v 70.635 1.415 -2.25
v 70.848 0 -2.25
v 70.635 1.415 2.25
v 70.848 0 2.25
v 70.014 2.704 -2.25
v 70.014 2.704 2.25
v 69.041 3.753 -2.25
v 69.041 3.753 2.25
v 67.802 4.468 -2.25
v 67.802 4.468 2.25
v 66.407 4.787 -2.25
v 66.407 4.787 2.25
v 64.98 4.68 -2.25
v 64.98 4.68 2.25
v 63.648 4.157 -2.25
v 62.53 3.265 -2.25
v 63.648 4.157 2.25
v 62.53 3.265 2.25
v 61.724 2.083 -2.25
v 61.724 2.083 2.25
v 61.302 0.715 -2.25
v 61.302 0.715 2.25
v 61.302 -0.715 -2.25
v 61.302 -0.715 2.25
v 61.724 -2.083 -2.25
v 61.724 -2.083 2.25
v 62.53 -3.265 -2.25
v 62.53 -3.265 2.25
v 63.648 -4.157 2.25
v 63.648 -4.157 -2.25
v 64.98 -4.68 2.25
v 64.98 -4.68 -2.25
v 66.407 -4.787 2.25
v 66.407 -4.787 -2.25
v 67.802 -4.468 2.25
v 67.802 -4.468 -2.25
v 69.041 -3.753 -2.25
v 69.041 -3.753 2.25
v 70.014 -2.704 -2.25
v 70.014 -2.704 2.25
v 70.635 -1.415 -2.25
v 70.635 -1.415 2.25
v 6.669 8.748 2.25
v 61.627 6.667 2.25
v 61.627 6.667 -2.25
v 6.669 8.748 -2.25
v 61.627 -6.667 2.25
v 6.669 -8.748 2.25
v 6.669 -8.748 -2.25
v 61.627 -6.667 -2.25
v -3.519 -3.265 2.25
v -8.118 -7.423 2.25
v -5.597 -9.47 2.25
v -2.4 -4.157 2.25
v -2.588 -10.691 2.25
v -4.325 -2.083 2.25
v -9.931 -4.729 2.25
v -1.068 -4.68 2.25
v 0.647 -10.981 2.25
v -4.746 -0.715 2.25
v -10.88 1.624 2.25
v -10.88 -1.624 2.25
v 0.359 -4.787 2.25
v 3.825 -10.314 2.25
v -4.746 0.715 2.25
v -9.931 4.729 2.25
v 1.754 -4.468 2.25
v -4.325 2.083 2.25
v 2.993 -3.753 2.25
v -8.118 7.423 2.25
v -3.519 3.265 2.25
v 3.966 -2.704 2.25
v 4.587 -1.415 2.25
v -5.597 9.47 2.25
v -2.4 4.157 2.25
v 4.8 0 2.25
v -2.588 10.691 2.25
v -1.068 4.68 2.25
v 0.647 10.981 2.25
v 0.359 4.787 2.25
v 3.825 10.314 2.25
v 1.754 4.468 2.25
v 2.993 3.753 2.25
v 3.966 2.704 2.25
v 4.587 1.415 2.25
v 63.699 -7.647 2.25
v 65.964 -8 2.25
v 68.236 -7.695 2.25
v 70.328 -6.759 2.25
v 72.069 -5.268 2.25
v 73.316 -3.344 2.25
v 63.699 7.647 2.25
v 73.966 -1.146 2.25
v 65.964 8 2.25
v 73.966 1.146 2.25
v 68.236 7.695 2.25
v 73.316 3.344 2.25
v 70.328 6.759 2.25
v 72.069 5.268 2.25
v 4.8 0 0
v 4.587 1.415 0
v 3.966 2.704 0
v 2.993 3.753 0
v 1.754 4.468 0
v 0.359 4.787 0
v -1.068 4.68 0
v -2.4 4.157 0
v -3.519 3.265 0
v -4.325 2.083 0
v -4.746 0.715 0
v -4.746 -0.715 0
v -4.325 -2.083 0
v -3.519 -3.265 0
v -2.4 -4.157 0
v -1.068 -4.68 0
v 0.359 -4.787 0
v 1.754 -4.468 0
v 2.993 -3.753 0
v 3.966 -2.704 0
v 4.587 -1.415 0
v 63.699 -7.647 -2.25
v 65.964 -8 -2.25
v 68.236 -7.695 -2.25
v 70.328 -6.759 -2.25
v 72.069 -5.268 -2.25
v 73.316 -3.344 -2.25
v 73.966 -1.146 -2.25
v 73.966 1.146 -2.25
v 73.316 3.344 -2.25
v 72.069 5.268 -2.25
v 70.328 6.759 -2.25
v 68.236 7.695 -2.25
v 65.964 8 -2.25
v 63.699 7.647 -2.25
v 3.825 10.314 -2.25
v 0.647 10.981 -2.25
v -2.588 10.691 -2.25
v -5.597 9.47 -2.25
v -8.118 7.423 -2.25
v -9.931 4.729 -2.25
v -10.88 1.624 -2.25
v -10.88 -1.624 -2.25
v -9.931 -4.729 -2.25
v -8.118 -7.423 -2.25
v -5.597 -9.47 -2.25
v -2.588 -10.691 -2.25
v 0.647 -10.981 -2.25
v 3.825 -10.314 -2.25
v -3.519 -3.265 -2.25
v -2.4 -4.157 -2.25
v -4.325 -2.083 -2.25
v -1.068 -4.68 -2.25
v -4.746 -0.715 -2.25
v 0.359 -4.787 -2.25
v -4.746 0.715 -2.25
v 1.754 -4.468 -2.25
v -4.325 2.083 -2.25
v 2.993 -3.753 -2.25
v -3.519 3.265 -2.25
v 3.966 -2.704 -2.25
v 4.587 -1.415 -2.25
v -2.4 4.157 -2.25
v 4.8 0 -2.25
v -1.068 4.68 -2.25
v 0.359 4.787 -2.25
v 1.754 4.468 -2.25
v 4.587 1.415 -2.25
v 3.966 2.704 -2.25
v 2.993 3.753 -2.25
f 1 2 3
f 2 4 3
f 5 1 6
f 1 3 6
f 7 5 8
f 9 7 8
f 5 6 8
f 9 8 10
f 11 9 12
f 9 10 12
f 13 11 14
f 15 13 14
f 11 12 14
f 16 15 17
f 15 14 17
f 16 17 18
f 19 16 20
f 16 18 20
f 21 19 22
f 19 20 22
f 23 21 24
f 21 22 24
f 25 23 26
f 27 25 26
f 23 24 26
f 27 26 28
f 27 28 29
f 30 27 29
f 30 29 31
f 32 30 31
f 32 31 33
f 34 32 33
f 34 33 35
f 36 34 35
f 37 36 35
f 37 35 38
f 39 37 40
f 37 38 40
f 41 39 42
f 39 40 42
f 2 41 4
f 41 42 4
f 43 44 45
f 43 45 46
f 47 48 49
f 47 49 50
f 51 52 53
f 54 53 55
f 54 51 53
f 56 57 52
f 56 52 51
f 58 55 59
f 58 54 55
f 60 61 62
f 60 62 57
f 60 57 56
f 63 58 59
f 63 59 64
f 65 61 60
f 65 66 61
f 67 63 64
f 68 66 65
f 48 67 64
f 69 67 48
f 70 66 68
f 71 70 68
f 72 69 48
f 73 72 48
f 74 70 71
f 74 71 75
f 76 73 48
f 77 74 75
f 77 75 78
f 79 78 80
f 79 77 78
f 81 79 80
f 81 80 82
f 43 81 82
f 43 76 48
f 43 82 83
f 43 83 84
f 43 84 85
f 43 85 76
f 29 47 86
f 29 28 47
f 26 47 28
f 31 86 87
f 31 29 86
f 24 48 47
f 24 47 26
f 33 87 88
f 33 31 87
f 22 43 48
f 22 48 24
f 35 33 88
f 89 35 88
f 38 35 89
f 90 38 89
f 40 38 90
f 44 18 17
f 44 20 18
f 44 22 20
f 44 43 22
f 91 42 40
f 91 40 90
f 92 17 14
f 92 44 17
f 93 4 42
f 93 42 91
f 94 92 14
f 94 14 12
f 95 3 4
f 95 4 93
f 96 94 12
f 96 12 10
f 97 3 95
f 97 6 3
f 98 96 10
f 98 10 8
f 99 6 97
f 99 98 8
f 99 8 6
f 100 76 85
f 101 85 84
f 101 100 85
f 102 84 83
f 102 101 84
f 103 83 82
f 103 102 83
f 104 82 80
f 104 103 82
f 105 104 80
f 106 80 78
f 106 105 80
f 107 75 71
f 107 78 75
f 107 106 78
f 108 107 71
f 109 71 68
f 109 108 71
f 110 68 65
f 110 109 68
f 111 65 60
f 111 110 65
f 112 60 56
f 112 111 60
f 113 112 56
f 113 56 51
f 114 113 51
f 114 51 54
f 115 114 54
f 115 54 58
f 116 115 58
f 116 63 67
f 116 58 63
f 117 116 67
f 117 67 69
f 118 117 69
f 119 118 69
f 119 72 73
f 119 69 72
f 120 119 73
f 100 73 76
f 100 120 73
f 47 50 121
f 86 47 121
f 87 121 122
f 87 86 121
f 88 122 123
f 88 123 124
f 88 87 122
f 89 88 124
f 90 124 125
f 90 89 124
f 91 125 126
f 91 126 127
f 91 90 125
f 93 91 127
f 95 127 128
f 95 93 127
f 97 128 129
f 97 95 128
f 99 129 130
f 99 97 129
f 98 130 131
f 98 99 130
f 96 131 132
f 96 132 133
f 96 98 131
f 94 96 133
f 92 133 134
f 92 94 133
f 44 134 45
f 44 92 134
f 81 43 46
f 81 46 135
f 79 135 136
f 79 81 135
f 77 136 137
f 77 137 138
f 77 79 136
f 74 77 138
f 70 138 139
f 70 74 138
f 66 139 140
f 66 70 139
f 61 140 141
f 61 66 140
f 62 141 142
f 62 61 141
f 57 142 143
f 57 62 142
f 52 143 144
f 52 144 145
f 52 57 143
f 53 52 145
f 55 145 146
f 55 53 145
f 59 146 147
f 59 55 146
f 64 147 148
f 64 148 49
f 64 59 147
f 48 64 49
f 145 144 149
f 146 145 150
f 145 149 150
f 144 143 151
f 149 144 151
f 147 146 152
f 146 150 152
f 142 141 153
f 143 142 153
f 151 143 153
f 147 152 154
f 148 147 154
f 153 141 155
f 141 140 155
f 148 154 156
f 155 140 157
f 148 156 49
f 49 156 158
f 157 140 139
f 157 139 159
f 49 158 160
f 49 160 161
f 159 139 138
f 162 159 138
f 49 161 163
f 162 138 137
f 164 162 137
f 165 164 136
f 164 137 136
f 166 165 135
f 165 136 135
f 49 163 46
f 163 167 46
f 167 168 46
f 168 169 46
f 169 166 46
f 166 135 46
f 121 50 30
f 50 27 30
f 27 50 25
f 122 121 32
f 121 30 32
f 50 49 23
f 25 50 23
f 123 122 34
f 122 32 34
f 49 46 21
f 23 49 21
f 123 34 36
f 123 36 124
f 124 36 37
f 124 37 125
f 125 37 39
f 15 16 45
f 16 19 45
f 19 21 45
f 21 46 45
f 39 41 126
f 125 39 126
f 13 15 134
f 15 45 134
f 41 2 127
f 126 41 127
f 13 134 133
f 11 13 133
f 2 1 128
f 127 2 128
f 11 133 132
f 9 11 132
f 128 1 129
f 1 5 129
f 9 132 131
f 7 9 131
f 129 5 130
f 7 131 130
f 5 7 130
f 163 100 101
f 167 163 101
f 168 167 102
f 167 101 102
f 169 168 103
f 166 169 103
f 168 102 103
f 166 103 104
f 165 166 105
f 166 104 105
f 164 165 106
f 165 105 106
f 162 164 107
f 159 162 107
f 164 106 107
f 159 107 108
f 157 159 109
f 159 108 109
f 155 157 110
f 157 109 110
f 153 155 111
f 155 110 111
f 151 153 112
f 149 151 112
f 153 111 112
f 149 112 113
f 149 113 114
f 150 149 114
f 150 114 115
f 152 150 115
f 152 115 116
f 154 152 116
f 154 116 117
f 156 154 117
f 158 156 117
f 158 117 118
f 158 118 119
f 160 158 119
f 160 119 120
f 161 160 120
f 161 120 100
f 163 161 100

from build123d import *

# Parameters (mm, degrees)
SKETCH1_R           = 11
BOSS_EXTRUDE1_DEPTH = 2.25
SKETCH2_R           = 8
BOSS_EXTRUDE2_DEPTH = 2.25
BOSS_EXTRUDE3_DEPTH = 2.25
SKETCH4_R           = 4.8
CUT_EXTRUDE1_DEPTH  = 4.5


with BuildPart() as part:
    # Sketch1 → Boss-Extrude1 (new, symmetric)
    with BuildSketch(Plane.XY):
        Circle(SKETCH1_R)
    extrude(amount=BOSS_EXTRUDE1_DEPTH, both=True)



with BuildPart() as body_2:
    # Sketch2 → Boss-Extrude2 (new, symmetric)
    with BuildSketch(Plane.XY):
        with Locations((66.0482, 0)):
            Circle(SKETCH2_R)
    extrude(amount=BOSS_EXTRUDE2_DEPTH, both=True)


with BuildPart() as part_1:
    add(part.part)

    add(body_2.part)  # Boss-Extrude3 merges body 2
    # Sketch3 → Boss-Extrude3 (add, symmetric)
    with BuildSketch(Plane.XY):
        Polygon((0, -9), (66.0482, -6.5), (66.0482, 6.5), (0, 9), align=None)
    extrude(amount=BOSS_EXTRUDE3_DEPTH, both=True)

    # Sketch4 → Cut-Extrude1 (cut, symmetric)
    with BuildSketch(Plane.XY):
        Circle(SKETCH4_R)
        with Locations((66.0482, 0)):
            Circle(SKETCH4_R)
    extrude(amount=CUT_EXTRUDE1_DEPTH, both=True, mode=Mode.SUBTRACT)


solid = part_1.part
